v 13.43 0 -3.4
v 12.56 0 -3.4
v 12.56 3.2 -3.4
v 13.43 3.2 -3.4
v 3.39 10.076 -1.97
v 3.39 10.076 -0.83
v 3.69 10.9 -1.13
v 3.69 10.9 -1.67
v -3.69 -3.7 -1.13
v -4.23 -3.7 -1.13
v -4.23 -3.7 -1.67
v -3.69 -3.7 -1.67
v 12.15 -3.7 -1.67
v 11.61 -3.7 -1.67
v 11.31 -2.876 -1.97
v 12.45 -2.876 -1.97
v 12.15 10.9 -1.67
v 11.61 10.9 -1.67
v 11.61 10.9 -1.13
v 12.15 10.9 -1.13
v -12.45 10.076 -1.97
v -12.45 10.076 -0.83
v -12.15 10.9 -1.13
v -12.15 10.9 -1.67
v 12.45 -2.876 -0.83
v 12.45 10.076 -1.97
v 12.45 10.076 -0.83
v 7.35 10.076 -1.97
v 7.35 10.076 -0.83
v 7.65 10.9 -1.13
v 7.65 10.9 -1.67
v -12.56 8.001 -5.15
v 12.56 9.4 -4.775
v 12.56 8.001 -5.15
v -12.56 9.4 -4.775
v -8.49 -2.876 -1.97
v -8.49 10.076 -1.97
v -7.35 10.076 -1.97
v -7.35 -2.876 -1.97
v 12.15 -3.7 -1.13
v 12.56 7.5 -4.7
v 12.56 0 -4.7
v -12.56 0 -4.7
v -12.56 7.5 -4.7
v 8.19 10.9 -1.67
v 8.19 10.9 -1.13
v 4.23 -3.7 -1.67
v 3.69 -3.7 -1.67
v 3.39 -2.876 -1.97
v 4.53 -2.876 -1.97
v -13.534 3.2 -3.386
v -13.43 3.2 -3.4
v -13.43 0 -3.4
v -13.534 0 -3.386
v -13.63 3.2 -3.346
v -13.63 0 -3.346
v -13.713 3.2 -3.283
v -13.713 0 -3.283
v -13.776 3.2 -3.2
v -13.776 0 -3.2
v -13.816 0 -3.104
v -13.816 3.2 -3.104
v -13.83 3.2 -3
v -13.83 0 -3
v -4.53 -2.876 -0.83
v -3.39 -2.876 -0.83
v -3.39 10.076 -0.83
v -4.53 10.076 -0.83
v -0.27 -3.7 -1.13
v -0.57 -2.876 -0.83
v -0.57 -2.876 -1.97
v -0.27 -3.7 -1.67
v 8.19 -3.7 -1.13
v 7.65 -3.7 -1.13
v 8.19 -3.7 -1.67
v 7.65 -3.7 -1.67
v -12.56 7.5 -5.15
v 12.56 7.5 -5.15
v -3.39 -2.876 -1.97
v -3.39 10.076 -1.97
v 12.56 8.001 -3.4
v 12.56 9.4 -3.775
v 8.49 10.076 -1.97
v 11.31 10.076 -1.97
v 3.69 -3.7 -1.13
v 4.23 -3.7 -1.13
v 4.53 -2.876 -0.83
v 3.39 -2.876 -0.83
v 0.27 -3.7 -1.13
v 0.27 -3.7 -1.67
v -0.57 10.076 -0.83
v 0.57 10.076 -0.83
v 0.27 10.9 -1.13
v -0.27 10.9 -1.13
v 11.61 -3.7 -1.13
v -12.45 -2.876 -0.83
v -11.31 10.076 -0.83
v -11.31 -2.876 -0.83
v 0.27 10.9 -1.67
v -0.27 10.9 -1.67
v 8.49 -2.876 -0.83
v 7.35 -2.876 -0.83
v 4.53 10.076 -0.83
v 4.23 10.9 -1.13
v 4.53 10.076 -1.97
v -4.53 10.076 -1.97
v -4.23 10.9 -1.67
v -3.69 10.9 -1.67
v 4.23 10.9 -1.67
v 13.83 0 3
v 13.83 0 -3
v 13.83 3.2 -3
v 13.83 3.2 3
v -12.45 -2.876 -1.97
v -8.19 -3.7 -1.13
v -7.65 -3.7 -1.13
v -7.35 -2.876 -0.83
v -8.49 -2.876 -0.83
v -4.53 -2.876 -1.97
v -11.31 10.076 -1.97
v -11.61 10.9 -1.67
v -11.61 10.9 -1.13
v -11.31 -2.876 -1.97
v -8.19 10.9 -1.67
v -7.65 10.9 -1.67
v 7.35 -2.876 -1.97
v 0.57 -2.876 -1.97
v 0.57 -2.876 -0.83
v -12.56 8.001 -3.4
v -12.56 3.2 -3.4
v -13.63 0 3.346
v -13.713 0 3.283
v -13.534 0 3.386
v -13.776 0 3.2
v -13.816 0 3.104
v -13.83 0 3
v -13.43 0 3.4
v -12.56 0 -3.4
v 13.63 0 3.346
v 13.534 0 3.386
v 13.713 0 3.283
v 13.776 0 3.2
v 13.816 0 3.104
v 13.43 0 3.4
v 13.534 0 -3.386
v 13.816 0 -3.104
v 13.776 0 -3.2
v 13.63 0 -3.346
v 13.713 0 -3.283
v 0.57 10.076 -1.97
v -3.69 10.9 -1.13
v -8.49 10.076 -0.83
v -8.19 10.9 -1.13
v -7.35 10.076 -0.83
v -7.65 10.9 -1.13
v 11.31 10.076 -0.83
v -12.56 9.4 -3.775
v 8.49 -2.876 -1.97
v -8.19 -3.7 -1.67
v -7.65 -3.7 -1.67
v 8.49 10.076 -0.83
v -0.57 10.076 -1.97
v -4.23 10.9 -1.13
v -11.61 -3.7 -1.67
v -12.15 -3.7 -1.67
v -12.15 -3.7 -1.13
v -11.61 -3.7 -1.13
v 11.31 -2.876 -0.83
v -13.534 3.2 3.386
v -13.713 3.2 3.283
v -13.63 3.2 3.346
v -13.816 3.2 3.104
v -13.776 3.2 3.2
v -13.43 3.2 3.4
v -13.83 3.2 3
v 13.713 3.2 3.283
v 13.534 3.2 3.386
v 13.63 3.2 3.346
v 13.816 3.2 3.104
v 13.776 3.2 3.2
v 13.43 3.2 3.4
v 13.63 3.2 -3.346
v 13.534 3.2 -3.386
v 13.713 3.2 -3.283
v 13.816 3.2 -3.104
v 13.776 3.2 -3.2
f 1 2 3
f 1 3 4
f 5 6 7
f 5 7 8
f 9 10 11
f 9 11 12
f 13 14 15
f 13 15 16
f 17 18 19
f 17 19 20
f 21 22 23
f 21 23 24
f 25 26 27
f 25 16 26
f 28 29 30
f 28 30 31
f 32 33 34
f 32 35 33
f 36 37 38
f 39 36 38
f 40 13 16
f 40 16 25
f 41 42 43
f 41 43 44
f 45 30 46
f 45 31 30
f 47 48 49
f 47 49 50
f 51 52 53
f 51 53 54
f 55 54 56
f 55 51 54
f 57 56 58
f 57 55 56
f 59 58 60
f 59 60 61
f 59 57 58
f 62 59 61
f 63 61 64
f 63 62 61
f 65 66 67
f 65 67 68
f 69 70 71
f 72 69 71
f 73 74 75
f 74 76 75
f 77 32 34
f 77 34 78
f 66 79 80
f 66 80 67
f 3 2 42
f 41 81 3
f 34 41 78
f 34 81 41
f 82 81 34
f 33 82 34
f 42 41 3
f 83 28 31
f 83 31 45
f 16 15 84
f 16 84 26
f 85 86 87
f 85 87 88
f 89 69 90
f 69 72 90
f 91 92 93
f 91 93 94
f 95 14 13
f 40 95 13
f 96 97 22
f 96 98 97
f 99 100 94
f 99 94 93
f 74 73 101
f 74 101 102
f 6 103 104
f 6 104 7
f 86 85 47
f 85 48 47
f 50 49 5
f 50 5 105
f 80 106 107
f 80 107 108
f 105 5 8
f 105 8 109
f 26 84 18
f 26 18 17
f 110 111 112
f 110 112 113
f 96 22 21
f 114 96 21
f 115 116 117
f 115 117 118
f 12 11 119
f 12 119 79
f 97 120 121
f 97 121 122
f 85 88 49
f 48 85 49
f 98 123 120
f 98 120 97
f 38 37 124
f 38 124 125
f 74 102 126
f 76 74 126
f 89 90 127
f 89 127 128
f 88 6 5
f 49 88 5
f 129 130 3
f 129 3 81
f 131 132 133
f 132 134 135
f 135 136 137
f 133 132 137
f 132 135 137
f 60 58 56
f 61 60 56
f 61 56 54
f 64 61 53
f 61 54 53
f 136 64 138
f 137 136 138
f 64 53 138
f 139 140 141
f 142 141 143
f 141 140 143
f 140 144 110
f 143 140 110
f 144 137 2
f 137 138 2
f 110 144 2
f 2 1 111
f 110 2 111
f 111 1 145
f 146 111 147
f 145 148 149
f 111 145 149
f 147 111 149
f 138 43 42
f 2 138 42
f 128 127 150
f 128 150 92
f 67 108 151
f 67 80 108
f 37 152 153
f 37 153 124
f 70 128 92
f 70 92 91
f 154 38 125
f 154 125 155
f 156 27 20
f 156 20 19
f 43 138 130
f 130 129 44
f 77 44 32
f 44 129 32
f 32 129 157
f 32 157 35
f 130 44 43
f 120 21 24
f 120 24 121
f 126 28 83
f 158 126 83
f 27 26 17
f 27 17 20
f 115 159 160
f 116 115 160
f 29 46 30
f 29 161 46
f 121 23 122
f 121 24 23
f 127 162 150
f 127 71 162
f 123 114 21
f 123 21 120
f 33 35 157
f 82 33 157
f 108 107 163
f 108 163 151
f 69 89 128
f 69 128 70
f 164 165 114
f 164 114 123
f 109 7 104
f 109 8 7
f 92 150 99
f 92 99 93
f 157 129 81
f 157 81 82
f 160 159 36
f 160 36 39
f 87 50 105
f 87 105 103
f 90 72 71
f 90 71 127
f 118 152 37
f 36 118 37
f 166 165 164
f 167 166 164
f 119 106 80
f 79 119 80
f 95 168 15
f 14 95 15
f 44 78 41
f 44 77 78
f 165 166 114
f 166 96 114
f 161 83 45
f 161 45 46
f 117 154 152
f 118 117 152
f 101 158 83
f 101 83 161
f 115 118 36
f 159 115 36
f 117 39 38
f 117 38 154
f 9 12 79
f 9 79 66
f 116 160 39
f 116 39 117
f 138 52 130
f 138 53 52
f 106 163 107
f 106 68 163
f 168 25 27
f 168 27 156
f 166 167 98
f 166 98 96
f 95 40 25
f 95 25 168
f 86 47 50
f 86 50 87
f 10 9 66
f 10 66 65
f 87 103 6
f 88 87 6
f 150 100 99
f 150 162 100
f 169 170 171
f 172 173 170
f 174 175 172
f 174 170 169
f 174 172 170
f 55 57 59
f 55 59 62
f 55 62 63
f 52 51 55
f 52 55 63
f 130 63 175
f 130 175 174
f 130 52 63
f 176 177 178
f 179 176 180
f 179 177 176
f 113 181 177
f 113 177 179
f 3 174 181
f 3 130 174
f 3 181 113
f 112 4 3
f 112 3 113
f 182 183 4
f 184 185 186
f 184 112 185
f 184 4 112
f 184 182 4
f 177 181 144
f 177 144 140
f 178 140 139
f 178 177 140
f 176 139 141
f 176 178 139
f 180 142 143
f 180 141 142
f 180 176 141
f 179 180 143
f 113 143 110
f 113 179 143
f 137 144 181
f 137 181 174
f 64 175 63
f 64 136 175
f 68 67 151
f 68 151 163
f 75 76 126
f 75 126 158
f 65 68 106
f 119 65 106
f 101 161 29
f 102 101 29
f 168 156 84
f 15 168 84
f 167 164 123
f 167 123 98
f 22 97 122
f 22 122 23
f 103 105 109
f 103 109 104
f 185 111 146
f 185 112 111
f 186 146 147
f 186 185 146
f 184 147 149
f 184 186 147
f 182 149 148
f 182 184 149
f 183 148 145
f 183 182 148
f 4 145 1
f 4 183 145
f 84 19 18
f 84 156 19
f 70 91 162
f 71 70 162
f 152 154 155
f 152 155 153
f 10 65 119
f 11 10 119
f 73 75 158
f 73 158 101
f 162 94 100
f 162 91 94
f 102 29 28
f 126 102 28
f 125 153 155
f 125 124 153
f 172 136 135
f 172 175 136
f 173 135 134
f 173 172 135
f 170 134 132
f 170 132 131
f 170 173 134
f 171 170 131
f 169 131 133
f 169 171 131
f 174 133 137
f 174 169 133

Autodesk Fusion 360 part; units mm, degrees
sketch "Skizze1" plane through (0, 0, 0) normal (0, 1, 0) x (1, 0, 0)
  line L0 (-13.83, 3.4) -> (13.83, 3.4)
  line L1 (13.83, 3.4) -> (13.83, -3.4)
  line L2 (13.83, -3.4) -> (-13.83, -3.4)
  line L3 (-13.83, -3.4) -> (-13.83, 3.4)
  line L4 (0, 3.4) -> (0, -3.4) construction
  dimension "d9" = 27.66
  dimension "d10" = 6.8
extrude "Extrusion1" add sketch "Skizze1" along normal blind 3.2 makes body 1
sketch "Skizze3" plane through (0, 0, 0) normal (1, 0, 0) x (0, 0, -1)
  line L0 (3.4, 0) -> (3.4, 3.2)
  line L1 (3.4, 0) -> (4.7, 0)
  line L2 (4.7, 0) -> (4.7, 9.4)
  line L3 (4.7, 9.4) -> (3.4, 9.4) construction
  line L4 (3.4, 9.4) -> (3.4, 0)
  line L5 (4.7, 9.4) -> (5.15, 9.4)
  line L6 (5.15, 9.4) -> (5.15, 0)
  line L7 (5.15, 0) -> (4.7, 0)
  line L8 (4.7, 0) -> (4.7, 9.4) construction
  line L9 (3.4, 8.0005) -> (3.775, 9.4)
  line L10 (4.775, 9.4) -> (5.15, 8.0005)
  line L11 (5.15, 7.5005) -> (4.7, 7.5005)
  line L12 (4.775, 9.4) -> (3.775, 9.4)
  line L13 (3.775, 9.4) -> (4.775, 9.4) construction
  line L14 (4.775, 9.4) -> (5.15, 9.4) construction
  line L15 (3.775, 9.4) -> (3.4, 9.4) construction
  line L16 (5.15, 9.4) -> (4.775, 9.4) construction
  line L17 (5.15, 8.0005) -> (5.15, 7.5005) construction
  line L18 (5.15, 7.5005) -> (5.15, 8.0005) construction
  line L19 (5.15, 9.4) -> (3.4, 9.4)
  line L20 (5.15, 0) -> (3.4, 0)
  dimension "d31" = 9.4
  dimension "d33" = 1.3
  dimension "d35" = 90
  dimension "d36" = 75
  dimension "d37" = 75
  dimension "d39" = 1
  dimension "d42" = 0.5
  dimension "d48" = 1.75
sketch "Skizze2" plane through (0, 0, 0) normal (0, 1, 0) x (1, 0, 0)
  line L0 (-11.31, 0.83) -> (-12.45, 0.83)
  line L1 (-12.45, 0.83) -> (-12.45, 1.97)
  line L2 (-12.45, 1.97) -> (-11.31, 1.97)
  line L3 (-11.31, 1.97) -> (-11.31, 0.83)
  line L4 (-13.83, 3.4) -> (13.83, 3.4)
  line L5 (13.83, 3.4) -> (13.83, -3.4)
  line L6 (13.83, -3.4) -> (-13.83, -3.4)
  line L7 (-13.83, -3.4) -> (-13.83, 3.4)
  line L8 (0, 3.4) -> (0, 1.4) construction
  line L9 (-11.31, 1.4) -> (-12.45, 1.4) construction
  line L10 (0, 1.4) -> (-11.88, 1.4)
  point P0 (-11.88, 1.4)
  dimension "d16" = 1.14
  dimension "d17" = 1.14
  dimension "d24" = 2
  dimension "d26" = 11.88
extrude "Extrusion3" add sketch "Skizze3" along normal mid plane 25.12 contours L0 L1 L2 L4 L9 L12 L19 L20 | L2 L5 L6 L10 L11 L12 L19 bodies 1
extrude "Extrusion2" add sketch "Skizze2" along normal blind 10.9 and the other way blind 3.7 separate body contours L0 L1 L2 L3 makes body 2
chamfer "Fase2" distance 0.3 angle 70 8 edges at (-11.88, 10.9, -0.83) (-11.31, 10.9, -1.4) (-11.88, 10.9, -1.97) (-12.45, 10.9, -1.4) (-11.31, -3.7, -1.4) (-11.88, -3.7, -0.83) (-12.45, -3.7, -1.4) (-11.88, -3.7, -1.97) measured on face at (-11.69, 10.9, -1.21) measured on face at (-11.69, 10.9, -1.21) measured on face at (-11.69, 10.9, -1.21) measured on face at (-11.69, 10.9, -1.21) measured on face at (-11.69, -3.7, -1.21) measured on face at (-11.69, -3.7, -1.21) measured on face at (-11.69, -3.7, -1.21) measured on face at (-11.69, -3.7, -1.21) on bodies 2
pattern_linear "R-Anordnung1" count 7 spacing 3.96 along (1, 0, 0) of bodies 2 makes body 3 at (-7.35, 1.4414, -1.59) makes body 4 at (-3.39, 1.4414, -1.59) makes body 5 at (0.57, 1.4414, -1.59) makes body 6 at (4.53, 1.4414, -1.59) makes body 7 at (8.49, 1.4414, -1.59) makes body 8 at (12.45, 1.4414, -1.59)
fillet "Abrundung1" radius 0.4 4 edges at (13.83, 1.6, -3.4) (13.83, 1.6, 3.4) (-13.83, 1.6, 3.4) (-13.83, 1.6, -3.4) on bodies 1
equation "n = 7" comment "Number of pins"
equation "P = 3.96 mm" comment "Pin pitch"
equation "B1 = A1 + ( 1.95 mm * 2 )" comment "Width of bottom plate"
equation "A1 = ( n - 1 ) * P" comment "Total width of all pins"
equation "C1 = 6.8 mm" comment "Height of bottom plate"
equation "H1 = 9.4 mm" comment "Height of latching plate"
equation "O1 = 2 mm" comment "Vertical offset pin-center to bottom plate border"
equation "d9 = B1"
equation "d10 = C1"
equation "D1 = 3.2 mm" comment "Total depth of bottom plate"
equation "Pw = 1.14 mm" comment "Width & height of square pin"
equation "d13 = D1"
equation "d16 = Pw"
equation "d17 = Pw"
equation "LPinTop = 7.7 mm + D1" comment "Length of the pin measured from the bottom plane to the top of the pin (away from PCB)"
equation "LPinBottom = 14.6 mm - LPinTop" comment "Length of the pin in bottom direction, measured from the bottom plane"
equation "d20 = LPinTop"
equation "d22 = LPinBottom"
equation "d24 = O1"
equation "Pin1XOffset = ( ( n - 1 ) * P ) / 2" comment "First pin X offset measured from the X axis"
equation "d26 = Pin1XOffset"
equation "d27 = n"
equation "d29 = P"
equation "d31 = H1"
equation "D2 = 1.3 mm" comment "(Measured) depth of latching plate (narrowest section)"
equation "d33 = D2"
equation "d35 = alpha"
equation "d36 = 90 deg - beta"
equation "d37 = 90 deg - beta"
equation "Wx1 = 1.0 mm" comment "(Measured) Width of the topmost part of the latching plate"
equation "Hx1 = 0.5 mm" comment "(Measured) Height of the latching surface facing away from the pins"
equation "alpha = 90 deg" comment "Angle of the latching surface. Shown by the datasheet as ~45°but real parts have 90°"
equation "d42 = Hx1"
equation "beta = 15 deg" comment "(Estimated) Latching plate tapering angle"
equation "WL1 = 1.27 mm" comment "(Measured) With of the section of the bottom plate where there is no latching plate per side)"
equation "d45 = B1 - ( WL1 * 2 )"
equation "Dlatch = 1.75 mm" comment "(Measured) Total depth of latching plate"
equation "d48 = Dlatch"
equation "d54 = delta"
equation "delta = 70 deg" comment "(Estimated) Taper angle of the pin top & bottoms"
